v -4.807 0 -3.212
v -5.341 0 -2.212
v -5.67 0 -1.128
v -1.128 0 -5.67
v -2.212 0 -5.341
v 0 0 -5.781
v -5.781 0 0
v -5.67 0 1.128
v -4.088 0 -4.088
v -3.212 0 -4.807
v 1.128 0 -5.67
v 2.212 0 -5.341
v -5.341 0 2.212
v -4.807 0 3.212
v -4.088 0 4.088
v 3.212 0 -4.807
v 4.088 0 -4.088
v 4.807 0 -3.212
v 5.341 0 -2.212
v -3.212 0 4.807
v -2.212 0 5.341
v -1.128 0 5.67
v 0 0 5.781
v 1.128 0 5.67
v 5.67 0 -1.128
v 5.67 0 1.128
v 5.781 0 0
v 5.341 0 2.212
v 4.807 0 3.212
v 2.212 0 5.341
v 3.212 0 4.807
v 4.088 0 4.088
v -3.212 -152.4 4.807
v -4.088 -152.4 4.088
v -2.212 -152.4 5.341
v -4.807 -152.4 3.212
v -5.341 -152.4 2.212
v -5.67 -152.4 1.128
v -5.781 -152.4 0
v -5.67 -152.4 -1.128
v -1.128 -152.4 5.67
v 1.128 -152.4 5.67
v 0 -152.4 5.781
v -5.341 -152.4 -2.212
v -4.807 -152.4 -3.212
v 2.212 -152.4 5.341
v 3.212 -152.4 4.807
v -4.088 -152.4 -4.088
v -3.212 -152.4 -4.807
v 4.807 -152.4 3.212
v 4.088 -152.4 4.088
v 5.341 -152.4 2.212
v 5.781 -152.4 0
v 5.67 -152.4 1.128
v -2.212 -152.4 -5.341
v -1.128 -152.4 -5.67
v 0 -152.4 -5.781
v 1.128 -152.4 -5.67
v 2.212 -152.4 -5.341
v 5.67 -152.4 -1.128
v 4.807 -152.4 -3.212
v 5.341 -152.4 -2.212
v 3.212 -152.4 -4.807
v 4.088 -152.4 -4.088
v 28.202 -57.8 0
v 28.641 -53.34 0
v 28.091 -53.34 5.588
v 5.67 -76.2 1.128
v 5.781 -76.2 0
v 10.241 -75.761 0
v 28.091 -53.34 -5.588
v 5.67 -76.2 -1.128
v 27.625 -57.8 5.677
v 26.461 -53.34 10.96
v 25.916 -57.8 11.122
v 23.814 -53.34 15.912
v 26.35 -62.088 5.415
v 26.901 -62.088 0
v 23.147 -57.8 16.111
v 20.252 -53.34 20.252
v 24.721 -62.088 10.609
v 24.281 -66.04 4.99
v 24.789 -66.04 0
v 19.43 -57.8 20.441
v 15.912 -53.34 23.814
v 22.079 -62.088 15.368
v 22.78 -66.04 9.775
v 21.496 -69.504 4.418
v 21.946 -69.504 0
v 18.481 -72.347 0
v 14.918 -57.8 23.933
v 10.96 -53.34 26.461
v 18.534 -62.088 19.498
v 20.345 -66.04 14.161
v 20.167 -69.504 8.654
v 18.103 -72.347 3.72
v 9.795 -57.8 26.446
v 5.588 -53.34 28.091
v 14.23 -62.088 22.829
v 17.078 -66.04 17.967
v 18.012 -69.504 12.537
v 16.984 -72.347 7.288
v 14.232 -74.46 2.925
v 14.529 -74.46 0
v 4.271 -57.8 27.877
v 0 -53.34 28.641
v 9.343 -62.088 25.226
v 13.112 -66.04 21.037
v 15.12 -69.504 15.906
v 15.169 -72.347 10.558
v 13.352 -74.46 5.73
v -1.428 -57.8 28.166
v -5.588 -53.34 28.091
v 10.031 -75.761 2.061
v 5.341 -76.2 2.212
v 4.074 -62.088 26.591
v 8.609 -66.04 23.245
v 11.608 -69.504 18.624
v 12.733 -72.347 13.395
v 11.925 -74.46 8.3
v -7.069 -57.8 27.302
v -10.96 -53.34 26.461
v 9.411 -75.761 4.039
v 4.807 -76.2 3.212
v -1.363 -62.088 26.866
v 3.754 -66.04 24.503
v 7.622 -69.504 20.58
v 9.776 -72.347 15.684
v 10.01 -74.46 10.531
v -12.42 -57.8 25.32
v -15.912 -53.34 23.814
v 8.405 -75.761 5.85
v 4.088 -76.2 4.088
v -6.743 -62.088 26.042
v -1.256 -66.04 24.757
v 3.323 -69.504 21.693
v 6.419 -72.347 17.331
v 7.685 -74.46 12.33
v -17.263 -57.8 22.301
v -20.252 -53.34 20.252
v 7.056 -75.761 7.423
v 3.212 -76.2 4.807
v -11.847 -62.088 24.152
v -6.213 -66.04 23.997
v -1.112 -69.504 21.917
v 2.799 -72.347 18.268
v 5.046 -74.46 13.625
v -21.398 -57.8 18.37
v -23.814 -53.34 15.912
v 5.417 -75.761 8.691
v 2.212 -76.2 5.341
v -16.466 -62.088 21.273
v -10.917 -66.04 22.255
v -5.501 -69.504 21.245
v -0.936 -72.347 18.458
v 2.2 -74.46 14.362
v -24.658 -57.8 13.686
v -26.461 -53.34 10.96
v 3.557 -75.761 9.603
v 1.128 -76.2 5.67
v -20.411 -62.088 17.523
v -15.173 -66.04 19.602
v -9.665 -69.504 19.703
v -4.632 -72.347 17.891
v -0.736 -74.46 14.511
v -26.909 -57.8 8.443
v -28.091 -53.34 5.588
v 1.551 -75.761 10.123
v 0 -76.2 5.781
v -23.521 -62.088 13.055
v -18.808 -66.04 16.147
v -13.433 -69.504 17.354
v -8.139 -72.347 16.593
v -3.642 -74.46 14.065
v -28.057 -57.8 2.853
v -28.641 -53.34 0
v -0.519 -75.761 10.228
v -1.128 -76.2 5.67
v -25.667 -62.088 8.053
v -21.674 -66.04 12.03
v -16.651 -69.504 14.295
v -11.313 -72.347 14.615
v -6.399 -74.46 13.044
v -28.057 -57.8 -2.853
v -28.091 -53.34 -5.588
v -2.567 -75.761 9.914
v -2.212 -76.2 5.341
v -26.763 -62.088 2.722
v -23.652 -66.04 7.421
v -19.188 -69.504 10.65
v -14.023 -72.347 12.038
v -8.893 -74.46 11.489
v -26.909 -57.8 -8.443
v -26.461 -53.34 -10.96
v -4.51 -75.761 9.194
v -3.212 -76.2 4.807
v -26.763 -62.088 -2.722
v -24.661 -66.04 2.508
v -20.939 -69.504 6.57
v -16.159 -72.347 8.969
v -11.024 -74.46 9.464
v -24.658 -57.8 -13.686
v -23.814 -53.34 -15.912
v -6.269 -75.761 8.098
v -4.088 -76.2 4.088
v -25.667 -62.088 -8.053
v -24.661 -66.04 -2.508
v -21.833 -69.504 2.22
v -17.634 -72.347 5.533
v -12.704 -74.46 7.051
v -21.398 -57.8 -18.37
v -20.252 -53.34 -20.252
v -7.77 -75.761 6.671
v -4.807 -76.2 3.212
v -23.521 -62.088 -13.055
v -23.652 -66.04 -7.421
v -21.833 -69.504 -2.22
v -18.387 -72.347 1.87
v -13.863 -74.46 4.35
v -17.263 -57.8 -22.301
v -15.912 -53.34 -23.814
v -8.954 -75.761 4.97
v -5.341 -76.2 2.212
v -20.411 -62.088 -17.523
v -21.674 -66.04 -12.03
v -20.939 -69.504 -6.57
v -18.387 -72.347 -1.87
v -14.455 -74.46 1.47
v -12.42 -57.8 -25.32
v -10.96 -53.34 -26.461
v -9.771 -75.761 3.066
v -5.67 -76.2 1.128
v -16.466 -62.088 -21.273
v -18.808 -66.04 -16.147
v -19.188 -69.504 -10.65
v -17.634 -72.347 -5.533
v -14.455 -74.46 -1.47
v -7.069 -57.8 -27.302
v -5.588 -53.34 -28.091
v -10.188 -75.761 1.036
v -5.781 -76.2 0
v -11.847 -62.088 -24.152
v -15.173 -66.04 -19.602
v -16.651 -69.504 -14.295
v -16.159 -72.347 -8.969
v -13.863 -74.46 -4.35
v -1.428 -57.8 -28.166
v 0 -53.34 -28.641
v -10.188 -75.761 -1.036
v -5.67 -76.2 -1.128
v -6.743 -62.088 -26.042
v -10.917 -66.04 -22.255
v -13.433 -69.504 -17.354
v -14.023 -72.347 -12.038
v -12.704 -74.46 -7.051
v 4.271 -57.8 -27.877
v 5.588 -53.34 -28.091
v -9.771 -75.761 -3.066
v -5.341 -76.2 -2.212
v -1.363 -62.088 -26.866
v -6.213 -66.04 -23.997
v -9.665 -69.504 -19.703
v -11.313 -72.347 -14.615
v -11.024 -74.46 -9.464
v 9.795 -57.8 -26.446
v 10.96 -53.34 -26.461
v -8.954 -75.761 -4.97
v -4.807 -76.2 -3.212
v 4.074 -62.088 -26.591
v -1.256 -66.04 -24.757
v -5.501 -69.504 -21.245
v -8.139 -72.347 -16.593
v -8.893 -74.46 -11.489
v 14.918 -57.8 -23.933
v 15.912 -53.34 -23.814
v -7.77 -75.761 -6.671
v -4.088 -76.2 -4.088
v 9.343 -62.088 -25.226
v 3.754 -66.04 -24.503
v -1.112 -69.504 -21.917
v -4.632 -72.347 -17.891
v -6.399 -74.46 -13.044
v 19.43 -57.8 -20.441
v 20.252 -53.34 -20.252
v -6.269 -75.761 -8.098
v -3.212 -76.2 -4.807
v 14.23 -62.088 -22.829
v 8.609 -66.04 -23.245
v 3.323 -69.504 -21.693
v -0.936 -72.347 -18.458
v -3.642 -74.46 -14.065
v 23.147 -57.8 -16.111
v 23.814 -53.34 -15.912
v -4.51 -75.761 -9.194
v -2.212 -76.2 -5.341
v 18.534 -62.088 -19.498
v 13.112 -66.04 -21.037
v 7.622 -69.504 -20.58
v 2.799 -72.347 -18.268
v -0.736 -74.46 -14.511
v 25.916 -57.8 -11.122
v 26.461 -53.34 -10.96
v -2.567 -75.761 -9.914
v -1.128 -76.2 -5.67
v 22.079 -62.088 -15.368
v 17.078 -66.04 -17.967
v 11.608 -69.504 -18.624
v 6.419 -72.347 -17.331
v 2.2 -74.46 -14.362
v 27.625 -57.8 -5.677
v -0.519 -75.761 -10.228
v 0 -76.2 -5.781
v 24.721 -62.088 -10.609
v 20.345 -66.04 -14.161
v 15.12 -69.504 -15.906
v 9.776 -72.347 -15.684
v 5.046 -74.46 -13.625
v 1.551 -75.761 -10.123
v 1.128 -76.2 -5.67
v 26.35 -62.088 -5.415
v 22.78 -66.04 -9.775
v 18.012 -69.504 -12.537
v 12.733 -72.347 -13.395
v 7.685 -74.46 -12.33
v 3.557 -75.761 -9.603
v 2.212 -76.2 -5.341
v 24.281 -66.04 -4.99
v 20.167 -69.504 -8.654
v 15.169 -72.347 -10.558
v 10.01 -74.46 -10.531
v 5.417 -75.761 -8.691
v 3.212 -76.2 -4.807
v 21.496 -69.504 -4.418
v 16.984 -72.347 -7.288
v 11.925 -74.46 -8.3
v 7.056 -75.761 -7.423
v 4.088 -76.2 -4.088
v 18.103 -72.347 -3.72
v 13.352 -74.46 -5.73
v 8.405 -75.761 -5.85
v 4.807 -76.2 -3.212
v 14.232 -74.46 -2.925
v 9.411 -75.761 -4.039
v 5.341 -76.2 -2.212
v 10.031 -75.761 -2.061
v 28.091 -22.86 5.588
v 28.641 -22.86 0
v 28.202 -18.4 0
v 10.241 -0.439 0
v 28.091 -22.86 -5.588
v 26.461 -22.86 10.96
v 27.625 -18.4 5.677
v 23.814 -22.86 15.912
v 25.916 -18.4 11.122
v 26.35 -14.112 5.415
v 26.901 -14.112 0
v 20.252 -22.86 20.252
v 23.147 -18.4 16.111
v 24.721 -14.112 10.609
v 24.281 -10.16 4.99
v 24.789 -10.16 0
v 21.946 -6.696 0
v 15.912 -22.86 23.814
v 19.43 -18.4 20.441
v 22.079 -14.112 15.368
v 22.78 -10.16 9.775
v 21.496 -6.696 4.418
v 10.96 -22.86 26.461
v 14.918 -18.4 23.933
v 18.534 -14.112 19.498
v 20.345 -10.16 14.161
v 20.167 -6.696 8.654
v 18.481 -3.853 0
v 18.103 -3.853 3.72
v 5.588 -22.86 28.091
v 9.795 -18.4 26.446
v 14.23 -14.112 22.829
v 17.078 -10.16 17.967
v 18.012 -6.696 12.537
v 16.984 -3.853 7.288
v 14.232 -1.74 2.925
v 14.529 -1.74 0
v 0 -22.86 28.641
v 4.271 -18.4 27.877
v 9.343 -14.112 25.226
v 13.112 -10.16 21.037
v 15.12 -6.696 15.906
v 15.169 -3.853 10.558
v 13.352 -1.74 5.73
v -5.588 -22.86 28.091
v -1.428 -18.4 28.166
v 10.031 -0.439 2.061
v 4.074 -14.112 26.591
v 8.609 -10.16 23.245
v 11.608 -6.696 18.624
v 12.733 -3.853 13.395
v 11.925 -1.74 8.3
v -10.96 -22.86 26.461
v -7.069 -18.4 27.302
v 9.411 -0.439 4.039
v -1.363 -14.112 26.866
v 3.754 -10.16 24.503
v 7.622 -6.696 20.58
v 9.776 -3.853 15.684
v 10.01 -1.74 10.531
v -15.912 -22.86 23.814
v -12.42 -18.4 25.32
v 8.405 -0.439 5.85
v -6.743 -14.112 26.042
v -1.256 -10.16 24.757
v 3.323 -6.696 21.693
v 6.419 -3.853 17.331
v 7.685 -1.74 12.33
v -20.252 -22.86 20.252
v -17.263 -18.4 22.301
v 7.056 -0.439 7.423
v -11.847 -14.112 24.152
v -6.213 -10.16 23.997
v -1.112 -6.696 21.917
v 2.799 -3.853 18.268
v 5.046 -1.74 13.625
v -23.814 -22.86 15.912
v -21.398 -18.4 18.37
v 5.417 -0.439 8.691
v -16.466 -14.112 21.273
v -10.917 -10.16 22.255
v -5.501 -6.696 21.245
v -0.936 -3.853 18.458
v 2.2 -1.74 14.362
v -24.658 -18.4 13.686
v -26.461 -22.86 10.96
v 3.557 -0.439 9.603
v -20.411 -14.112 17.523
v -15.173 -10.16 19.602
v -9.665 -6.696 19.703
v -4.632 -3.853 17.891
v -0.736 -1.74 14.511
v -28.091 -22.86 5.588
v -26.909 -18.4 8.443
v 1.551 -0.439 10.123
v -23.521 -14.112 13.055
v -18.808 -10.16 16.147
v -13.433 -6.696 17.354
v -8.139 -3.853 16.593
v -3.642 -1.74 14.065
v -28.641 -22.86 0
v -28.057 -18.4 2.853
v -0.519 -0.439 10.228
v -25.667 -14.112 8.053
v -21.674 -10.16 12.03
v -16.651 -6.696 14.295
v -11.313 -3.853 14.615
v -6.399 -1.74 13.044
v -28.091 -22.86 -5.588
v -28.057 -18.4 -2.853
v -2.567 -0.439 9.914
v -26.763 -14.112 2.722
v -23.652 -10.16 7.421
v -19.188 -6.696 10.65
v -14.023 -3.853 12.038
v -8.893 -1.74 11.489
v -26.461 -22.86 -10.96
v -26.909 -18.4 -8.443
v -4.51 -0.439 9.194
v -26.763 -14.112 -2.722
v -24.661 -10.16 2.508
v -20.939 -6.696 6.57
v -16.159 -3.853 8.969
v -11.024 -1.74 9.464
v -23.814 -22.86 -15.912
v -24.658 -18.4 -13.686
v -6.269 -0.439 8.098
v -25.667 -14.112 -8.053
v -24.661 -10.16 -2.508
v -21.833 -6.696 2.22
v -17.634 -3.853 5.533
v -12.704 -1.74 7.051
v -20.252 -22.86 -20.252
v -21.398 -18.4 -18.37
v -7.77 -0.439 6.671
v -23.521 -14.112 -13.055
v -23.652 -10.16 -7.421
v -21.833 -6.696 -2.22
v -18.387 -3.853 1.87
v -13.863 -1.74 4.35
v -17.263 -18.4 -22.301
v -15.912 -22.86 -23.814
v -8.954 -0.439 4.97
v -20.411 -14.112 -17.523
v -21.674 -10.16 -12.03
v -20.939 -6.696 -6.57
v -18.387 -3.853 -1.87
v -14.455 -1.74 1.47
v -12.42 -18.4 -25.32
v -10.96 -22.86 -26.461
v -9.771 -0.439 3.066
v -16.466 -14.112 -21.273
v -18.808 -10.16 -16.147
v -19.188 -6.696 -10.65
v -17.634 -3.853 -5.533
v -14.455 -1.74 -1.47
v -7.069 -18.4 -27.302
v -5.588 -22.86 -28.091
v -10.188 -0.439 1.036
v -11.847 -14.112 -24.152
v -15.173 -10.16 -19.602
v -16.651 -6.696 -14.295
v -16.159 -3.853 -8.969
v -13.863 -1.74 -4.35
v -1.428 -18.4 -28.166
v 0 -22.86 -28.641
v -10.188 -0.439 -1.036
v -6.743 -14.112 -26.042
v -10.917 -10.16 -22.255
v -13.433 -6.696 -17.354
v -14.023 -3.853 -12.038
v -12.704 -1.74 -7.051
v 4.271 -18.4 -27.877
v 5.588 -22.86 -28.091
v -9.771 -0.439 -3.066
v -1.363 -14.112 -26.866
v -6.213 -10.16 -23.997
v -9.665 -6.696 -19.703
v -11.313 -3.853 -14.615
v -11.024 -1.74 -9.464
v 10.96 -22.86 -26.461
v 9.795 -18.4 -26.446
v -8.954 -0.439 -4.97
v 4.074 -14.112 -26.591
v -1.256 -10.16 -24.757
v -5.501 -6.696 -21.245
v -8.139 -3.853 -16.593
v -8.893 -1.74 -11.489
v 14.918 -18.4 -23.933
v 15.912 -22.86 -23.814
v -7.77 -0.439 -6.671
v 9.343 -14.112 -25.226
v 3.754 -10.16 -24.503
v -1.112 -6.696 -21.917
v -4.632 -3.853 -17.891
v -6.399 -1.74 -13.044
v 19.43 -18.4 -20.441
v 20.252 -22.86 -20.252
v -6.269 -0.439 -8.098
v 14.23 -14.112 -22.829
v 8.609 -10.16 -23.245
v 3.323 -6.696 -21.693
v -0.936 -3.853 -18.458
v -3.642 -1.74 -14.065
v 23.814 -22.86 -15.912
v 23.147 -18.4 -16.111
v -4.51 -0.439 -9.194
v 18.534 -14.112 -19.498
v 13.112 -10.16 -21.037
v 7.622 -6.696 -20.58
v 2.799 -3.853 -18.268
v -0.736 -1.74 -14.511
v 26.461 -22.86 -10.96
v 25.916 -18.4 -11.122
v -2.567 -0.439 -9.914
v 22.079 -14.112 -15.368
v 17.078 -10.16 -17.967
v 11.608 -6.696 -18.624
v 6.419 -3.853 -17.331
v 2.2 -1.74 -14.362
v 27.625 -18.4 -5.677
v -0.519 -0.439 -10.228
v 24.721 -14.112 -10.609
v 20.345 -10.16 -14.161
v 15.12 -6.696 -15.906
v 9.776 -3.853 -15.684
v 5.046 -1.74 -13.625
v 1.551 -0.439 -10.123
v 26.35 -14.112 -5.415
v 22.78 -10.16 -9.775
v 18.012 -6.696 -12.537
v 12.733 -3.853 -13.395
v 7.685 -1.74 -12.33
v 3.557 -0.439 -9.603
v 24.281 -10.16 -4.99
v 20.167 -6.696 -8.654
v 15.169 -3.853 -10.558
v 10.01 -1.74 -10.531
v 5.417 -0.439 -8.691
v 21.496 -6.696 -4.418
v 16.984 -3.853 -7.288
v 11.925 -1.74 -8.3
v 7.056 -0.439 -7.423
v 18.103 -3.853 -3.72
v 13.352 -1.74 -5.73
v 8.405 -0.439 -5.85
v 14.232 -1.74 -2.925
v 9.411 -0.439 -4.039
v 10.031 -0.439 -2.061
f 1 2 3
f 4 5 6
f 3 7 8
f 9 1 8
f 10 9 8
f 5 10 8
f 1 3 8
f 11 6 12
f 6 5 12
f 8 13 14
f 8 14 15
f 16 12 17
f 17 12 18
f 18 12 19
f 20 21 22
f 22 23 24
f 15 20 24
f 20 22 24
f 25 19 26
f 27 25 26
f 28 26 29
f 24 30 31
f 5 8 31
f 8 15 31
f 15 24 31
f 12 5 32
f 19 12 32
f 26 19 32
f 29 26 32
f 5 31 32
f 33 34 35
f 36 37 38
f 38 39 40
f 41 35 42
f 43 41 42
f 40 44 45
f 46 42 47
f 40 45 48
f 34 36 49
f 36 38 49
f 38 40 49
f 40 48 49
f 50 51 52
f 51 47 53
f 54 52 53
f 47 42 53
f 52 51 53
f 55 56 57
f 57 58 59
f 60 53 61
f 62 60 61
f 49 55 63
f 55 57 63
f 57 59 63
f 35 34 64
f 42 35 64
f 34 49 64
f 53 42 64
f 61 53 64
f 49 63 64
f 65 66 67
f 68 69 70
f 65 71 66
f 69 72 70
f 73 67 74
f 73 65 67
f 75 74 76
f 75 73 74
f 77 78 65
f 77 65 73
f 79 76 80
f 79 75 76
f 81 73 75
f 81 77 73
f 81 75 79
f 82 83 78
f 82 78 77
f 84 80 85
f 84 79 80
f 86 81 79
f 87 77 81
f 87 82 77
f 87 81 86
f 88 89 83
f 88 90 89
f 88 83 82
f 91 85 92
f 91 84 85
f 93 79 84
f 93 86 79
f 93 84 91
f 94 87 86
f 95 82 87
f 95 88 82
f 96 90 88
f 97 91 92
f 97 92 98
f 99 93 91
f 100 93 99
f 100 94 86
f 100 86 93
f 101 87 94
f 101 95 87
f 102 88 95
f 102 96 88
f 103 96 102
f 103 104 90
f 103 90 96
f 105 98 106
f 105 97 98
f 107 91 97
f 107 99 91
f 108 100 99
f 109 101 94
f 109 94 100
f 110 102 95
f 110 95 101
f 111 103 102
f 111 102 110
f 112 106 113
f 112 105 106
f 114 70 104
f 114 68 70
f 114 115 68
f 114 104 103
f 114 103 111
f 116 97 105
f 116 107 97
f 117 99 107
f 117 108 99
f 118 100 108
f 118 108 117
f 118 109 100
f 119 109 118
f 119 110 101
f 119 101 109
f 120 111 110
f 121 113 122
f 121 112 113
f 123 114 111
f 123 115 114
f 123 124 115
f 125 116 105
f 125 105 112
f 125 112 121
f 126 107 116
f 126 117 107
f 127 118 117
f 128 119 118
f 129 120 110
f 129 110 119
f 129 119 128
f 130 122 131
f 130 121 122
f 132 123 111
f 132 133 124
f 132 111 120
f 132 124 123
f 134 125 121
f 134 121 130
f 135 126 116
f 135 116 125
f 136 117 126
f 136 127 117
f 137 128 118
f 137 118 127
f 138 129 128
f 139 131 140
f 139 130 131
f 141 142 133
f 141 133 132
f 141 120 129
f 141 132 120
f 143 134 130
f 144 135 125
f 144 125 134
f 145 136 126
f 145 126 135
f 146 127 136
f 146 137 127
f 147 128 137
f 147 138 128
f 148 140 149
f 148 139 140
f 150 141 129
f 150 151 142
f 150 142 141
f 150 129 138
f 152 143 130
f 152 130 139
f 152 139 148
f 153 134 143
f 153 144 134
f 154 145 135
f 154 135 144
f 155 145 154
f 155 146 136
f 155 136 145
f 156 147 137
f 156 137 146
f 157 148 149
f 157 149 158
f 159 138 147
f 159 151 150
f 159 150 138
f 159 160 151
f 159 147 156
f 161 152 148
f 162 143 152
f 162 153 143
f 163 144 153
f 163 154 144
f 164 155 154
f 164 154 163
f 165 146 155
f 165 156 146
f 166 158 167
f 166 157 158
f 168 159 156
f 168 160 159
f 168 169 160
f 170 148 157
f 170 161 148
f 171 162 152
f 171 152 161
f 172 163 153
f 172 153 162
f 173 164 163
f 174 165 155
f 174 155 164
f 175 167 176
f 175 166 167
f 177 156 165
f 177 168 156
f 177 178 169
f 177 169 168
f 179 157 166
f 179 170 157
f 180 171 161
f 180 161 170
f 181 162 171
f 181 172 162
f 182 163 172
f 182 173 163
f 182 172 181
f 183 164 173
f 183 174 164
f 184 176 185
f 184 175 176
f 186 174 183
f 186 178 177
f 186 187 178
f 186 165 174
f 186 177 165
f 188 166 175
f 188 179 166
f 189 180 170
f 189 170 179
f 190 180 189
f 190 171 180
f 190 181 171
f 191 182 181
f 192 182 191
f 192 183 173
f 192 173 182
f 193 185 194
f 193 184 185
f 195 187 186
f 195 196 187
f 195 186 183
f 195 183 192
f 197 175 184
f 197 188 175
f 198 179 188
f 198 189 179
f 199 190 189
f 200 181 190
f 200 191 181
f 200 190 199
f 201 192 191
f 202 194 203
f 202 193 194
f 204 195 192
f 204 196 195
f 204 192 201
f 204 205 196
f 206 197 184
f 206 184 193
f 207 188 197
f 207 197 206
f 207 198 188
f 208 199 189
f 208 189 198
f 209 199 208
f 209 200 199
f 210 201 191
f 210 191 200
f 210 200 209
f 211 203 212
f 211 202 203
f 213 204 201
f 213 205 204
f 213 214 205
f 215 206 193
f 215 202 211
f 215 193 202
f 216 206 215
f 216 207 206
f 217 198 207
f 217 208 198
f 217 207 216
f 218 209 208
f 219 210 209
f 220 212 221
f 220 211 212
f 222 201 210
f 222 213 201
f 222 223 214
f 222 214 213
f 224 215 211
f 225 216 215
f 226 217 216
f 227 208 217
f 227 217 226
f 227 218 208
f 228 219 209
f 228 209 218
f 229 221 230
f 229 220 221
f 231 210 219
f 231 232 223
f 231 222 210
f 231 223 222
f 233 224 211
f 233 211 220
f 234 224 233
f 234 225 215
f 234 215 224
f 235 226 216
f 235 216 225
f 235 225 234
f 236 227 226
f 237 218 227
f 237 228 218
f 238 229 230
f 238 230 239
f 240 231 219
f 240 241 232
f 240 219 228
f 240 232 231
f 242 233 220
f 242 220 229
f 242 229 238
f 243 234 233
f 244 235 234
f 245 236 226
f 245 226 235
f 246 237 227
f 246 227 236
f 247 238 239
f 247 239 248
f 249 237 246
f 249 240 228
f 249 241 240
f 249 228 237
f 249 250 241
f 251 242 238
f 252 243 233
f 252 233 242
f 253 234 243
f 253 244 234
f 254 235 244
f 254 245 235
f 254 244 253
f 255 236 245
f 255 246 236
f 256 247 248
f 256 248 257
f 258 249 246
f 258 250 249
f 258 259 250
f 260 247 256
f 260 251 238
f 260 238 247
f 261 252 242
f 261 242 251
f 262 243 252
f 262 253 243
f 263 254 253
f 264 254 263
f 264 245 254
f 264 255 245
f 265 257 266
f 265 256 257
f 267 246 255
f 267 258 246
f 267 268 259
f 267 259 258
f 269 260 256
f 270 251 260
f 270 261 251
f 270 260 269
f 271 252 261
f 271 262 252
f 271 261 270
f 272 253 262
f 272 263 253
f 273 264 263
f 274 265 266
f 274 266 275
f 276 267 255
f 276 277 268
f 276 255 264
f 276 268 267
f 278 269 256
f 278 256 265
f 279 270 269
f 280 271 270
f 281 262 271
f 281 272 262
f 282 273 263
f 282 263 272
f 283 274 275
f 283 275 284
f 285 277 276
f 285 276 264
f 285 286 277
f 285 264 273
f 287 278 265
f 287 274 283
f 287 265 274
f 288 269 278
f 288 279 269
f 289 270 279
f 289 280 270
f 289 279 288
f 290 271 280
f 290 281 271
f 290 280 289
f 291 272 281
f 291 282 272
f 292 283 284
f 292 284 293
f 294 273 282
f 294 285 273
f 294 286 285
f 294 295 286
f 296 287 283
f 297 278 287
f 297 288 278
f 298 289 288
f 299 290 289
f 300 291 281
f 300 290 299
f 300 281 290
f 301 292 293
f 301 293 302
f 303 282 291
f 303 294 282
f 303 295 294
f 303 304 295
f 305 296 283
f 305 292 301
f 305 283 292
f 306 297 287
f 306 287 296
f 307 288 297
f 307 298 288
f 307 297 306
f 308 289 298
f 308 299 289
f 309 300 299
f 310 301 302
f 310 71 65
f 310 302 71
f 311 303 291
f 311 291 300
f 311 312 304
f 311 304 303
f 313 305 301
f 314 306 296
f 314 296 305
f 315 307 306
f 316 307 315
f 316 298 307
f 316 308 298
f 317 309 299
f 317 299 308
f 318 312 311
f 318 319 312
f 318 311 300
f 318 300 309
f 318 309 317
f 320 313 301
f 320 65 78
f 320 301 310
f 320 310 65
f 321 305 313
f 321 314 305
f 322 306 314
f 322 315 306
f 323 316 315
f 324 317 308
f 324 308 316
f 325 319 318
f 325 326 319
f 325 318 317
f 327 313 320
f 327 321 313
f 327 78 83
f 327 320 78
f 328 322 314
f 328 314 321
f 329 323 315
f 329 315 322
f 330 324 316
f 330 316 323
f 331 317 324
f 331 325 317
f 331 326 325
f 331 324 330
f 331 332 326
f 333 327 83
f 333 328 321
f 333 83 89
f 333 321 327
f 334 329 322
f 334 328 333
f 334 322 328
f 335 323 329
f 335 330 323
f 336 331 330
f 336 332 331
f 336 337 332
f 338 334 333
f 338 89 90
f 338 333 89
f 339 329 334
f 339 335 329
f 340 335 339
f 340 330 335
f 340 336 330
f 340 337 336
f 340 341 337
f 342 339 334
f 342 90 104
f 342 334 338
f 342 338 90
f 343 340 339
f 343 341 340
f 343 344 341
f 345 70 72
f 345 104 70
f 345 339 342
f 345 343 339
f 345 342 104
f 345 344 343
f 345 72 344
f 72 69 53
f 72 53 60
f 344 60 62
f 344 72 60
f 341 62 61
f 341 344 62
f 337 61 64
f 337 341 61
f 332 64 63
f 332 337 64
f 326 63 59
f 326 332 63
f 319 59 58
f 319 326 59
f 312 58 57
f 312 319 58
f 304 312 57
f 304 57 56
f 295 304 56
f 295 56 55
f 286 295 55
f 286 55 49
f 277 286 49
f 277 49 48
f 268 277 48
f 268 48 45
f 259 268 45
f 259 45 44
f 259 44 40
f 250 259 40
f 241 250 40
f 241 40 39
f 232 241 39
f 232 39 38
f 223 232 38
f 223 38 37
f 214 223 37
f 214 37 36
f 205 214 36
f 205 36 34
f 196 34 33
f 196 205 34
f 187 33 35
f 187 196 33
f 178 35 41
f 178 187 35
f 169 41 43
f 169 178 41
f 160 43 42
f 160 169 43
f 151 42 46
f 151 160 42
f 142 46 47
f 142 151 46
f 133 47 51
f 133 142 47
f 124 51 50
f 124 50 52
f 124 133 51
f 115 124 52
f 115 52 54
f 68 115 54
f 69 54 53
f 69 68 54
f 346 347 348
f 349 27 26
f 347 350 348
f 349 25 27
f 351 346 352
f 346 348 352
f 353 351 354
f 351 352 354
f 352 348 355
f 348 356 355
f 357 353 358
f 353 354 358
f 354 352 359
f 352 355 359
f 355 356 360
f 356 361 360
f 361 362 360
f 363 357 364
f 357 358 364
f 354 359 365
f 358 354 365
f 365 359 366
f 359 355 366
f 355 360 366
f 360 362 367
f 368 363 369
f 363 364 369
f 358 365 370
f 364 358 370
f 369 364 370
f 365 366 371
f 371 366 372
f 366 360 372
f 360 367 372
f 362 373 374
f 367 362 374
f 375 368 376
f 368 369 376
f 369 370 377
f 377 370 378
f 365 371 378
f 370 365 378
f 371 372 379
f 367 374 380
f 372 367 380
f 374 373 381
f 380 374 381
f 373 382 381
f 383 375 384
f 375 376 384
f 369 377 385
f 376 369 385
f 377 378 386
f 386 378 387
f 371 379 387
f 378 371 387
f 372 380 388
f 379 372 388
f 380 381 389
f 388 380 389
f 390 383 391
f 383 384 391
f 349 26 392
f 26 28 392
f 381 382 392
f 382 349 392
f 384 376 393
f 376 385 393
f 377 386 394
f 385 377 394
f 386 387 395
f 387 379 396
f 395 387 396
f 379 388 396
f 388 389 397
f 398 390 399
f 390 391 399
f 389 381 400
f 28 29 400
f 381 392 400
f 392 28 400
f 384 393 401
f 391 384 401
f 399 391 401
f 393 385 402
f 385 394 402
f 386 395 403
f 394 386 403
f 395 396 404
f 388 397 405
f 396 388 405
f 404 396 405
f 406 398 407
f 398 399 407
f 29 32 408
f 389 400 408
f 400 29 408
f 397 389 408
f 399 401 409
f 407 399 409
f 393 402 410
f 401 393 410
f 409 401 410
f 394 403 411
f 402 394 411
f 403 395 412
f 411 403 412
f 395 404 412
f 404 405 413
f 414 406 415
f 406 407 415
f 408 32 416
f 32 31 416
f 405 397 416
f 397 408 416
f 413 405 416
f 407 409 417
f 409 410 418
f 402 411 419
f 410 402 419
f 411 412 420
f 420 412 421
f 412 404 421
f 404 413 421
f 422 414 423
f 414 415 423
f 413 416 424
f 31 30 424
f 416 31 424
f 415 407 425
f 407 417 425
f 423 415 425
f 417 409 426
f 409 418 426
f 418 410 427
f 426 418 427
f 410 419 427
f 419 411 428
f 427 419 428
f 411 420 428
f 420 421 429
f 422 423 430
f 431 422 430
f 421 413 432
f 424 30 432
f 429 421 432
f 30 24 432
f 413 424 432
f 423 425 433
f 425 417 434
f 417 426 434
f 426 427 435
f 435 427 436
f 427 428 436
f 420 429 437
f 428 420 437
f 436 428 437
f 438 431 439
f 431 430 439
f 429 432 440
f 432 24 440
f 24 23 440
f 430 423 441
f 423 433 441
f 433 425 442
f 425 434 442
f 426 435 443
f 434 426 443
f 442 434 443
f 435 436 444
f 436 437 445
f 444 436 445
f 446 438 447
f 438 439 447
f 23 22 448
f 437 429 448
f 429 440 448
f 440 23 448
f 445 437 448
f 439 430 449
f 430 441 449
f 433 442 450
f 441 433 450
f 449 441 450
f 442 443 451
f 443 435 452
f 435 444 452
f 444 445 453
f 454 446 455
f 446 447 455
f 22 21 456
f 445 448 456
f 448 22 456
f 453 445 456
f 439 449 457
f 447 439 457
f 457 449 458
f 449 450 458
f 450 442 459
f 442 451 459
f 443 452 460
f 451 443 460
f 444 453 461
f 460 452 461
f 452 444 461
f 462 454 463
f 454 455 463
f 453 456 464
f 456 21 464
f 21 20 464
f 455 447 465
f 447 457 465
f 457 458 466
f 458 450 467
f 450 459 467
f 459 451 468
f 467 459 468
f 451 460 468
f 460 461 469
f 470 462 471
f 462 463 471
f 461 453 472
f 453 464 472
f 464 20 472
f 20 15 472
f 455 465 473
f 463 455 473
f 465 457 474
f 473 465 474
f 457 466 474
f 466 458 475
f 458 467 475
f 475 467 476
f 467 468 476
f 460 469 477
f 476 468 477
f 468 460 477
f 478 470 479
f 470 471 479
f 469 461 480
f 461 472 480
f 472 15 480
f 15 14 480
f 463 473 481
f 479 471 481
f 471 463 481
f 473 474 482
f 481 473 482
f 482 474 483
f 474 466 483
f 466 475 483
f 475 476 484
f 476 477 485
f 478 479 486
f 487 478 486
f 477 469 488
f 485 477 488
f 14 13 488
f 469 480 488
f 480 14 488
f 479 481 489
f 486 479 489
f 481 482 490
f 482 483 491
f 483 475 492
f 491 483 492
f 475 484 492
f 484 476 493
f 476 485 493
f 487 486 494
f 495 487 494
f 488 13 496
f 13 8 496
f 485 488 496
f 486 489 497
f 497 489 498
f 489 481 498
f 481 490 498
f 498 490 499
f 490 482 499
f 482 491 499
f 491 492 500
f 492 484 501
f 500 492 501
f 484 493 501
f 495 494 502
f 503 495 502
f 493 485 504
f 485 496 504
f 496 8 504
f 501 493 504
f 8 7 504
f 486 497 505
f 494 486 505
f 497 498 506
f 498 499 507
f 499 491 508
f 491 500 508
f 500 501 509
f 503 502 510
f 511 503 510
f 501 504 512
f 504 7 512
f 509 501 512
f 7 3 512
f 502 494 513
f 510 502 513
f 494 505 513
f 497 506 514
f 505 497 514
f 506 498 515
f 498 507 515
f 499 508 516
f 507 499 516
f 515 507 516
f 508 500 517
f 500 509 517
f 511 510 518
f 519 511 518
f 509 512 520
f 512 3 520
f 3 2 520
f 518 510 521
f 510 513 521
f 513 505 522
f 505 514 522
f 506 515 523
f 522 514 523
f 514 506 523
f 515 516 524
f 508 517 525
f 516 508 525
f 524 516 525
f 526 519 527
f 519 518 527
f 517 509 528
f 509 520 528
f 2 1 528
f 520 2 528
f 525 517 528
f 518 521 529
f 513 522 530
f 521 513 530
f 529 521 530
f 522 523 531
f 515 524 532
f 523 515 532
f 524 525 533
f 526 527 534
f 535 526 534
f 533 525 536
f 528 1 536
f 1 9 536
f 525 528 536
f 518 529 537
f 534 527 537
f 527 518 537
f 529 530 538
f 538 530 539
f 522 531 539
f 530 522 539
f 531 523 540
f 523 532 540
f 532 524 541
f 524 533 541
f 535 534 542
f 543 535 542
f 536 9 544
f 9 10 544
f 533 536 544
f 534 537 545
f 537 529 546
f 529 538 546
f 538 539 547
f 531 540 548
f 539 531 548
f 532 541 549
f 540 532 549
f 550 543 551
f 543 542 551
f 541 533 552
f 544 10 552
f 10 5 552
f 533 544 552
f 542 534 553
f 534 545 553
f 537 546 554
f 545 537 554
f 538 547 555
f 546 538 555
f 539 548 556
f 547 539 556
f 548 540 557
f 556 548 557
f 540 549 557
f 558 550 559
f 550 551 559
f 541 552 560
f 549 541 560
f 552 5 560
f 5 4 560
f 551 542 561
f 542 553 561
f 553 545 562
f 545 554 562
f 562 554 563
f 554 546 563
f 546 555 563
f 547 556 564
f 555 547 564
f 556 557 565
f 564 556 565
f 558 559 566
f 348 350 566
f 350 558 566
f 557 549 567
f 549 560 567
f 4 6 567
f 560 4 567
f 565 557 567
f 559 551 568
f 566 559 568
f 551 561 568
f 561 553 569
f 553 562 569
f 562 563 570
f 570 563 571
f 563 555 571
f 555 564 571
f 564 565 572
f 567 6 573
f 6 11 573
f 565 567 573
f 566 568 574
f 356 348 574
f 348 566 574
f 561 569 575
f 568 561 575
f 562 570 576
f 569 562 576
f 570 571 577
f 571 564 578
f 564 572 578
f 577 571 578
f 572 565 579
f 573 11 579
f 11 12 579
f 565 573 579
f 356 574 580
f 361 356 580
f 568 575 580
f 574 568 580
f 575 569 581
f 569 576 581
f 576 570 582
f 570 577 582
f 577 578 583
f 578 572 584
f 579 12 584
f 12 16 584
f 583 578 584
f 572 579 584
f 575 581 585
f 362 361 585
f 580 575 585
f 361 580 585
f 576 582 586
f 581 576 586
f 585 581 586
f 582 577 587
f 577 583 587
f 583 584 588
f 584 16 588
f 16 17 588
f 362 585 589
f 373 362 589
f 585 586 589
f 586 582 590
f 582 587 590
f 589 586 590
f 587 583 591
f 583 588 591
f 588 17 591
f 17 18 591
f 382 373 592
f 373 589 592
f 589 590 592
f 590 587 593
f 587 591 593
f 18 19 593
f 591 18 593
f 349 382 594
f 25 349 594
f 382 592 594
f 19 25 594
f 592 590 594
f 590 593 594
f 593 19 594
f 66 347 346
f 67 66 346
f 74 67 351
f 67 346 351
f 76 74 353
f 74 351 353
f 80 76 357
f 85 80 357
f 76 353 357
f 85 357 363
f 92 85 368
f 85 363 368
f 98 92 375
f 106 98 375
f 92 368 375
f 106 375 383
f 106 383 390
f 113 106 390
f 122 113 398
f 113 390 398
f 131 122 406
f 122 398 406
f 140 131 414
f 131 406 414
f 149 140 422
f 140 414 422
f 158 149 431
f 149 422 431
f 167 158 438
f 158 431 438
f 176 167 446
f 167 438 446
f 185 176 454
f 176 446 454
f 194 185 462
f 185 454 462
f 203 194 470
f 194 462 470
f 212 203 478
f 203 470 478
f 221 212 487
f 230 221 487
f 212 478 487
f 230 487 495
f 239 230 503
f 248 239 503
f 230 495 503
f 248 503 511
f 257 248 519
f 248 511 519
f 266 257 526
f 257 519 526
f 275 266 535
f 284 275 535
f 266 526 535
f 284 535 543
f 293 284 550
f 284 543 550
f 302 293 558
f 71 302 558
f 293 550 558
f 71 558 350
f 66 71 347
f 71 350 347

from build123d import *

# Parameters (mm, degrees)
F0_R      = 28.641111
F1_DEPTH  = 76.2
F2_R      = 22.86
F1_FACE_R = 5.781111
F3_DEPTH  = 152.4


with BuildPart() as f1:
    # F0 (on Front) → F1 (new body)
    with BuildSketch(Plane.XZ):
        Circle(F0_R)
    extrude(amount=F1_DEPTH)

    # F2
    f2_edges = [f1.edges().sort_by_distance(p)[0] for p in [
        (-28.641111, -76.2, 0),
        (28.641111, -38.1, 0),
        (-28.641111, 0, 0),
    ]]
    fillet(f2_edges, radius=F2_R)

    # F1_face (on face) → F3 (join)
    with BuildSketch(Plane(origin=(0, 0, 0), x_dir=(1, 0, 0), z_dir=(0, 1, 0))):
        Circle(F1_FACE_R)
    extrude(amount=-F3_DEPTH)


solid = f1.part
